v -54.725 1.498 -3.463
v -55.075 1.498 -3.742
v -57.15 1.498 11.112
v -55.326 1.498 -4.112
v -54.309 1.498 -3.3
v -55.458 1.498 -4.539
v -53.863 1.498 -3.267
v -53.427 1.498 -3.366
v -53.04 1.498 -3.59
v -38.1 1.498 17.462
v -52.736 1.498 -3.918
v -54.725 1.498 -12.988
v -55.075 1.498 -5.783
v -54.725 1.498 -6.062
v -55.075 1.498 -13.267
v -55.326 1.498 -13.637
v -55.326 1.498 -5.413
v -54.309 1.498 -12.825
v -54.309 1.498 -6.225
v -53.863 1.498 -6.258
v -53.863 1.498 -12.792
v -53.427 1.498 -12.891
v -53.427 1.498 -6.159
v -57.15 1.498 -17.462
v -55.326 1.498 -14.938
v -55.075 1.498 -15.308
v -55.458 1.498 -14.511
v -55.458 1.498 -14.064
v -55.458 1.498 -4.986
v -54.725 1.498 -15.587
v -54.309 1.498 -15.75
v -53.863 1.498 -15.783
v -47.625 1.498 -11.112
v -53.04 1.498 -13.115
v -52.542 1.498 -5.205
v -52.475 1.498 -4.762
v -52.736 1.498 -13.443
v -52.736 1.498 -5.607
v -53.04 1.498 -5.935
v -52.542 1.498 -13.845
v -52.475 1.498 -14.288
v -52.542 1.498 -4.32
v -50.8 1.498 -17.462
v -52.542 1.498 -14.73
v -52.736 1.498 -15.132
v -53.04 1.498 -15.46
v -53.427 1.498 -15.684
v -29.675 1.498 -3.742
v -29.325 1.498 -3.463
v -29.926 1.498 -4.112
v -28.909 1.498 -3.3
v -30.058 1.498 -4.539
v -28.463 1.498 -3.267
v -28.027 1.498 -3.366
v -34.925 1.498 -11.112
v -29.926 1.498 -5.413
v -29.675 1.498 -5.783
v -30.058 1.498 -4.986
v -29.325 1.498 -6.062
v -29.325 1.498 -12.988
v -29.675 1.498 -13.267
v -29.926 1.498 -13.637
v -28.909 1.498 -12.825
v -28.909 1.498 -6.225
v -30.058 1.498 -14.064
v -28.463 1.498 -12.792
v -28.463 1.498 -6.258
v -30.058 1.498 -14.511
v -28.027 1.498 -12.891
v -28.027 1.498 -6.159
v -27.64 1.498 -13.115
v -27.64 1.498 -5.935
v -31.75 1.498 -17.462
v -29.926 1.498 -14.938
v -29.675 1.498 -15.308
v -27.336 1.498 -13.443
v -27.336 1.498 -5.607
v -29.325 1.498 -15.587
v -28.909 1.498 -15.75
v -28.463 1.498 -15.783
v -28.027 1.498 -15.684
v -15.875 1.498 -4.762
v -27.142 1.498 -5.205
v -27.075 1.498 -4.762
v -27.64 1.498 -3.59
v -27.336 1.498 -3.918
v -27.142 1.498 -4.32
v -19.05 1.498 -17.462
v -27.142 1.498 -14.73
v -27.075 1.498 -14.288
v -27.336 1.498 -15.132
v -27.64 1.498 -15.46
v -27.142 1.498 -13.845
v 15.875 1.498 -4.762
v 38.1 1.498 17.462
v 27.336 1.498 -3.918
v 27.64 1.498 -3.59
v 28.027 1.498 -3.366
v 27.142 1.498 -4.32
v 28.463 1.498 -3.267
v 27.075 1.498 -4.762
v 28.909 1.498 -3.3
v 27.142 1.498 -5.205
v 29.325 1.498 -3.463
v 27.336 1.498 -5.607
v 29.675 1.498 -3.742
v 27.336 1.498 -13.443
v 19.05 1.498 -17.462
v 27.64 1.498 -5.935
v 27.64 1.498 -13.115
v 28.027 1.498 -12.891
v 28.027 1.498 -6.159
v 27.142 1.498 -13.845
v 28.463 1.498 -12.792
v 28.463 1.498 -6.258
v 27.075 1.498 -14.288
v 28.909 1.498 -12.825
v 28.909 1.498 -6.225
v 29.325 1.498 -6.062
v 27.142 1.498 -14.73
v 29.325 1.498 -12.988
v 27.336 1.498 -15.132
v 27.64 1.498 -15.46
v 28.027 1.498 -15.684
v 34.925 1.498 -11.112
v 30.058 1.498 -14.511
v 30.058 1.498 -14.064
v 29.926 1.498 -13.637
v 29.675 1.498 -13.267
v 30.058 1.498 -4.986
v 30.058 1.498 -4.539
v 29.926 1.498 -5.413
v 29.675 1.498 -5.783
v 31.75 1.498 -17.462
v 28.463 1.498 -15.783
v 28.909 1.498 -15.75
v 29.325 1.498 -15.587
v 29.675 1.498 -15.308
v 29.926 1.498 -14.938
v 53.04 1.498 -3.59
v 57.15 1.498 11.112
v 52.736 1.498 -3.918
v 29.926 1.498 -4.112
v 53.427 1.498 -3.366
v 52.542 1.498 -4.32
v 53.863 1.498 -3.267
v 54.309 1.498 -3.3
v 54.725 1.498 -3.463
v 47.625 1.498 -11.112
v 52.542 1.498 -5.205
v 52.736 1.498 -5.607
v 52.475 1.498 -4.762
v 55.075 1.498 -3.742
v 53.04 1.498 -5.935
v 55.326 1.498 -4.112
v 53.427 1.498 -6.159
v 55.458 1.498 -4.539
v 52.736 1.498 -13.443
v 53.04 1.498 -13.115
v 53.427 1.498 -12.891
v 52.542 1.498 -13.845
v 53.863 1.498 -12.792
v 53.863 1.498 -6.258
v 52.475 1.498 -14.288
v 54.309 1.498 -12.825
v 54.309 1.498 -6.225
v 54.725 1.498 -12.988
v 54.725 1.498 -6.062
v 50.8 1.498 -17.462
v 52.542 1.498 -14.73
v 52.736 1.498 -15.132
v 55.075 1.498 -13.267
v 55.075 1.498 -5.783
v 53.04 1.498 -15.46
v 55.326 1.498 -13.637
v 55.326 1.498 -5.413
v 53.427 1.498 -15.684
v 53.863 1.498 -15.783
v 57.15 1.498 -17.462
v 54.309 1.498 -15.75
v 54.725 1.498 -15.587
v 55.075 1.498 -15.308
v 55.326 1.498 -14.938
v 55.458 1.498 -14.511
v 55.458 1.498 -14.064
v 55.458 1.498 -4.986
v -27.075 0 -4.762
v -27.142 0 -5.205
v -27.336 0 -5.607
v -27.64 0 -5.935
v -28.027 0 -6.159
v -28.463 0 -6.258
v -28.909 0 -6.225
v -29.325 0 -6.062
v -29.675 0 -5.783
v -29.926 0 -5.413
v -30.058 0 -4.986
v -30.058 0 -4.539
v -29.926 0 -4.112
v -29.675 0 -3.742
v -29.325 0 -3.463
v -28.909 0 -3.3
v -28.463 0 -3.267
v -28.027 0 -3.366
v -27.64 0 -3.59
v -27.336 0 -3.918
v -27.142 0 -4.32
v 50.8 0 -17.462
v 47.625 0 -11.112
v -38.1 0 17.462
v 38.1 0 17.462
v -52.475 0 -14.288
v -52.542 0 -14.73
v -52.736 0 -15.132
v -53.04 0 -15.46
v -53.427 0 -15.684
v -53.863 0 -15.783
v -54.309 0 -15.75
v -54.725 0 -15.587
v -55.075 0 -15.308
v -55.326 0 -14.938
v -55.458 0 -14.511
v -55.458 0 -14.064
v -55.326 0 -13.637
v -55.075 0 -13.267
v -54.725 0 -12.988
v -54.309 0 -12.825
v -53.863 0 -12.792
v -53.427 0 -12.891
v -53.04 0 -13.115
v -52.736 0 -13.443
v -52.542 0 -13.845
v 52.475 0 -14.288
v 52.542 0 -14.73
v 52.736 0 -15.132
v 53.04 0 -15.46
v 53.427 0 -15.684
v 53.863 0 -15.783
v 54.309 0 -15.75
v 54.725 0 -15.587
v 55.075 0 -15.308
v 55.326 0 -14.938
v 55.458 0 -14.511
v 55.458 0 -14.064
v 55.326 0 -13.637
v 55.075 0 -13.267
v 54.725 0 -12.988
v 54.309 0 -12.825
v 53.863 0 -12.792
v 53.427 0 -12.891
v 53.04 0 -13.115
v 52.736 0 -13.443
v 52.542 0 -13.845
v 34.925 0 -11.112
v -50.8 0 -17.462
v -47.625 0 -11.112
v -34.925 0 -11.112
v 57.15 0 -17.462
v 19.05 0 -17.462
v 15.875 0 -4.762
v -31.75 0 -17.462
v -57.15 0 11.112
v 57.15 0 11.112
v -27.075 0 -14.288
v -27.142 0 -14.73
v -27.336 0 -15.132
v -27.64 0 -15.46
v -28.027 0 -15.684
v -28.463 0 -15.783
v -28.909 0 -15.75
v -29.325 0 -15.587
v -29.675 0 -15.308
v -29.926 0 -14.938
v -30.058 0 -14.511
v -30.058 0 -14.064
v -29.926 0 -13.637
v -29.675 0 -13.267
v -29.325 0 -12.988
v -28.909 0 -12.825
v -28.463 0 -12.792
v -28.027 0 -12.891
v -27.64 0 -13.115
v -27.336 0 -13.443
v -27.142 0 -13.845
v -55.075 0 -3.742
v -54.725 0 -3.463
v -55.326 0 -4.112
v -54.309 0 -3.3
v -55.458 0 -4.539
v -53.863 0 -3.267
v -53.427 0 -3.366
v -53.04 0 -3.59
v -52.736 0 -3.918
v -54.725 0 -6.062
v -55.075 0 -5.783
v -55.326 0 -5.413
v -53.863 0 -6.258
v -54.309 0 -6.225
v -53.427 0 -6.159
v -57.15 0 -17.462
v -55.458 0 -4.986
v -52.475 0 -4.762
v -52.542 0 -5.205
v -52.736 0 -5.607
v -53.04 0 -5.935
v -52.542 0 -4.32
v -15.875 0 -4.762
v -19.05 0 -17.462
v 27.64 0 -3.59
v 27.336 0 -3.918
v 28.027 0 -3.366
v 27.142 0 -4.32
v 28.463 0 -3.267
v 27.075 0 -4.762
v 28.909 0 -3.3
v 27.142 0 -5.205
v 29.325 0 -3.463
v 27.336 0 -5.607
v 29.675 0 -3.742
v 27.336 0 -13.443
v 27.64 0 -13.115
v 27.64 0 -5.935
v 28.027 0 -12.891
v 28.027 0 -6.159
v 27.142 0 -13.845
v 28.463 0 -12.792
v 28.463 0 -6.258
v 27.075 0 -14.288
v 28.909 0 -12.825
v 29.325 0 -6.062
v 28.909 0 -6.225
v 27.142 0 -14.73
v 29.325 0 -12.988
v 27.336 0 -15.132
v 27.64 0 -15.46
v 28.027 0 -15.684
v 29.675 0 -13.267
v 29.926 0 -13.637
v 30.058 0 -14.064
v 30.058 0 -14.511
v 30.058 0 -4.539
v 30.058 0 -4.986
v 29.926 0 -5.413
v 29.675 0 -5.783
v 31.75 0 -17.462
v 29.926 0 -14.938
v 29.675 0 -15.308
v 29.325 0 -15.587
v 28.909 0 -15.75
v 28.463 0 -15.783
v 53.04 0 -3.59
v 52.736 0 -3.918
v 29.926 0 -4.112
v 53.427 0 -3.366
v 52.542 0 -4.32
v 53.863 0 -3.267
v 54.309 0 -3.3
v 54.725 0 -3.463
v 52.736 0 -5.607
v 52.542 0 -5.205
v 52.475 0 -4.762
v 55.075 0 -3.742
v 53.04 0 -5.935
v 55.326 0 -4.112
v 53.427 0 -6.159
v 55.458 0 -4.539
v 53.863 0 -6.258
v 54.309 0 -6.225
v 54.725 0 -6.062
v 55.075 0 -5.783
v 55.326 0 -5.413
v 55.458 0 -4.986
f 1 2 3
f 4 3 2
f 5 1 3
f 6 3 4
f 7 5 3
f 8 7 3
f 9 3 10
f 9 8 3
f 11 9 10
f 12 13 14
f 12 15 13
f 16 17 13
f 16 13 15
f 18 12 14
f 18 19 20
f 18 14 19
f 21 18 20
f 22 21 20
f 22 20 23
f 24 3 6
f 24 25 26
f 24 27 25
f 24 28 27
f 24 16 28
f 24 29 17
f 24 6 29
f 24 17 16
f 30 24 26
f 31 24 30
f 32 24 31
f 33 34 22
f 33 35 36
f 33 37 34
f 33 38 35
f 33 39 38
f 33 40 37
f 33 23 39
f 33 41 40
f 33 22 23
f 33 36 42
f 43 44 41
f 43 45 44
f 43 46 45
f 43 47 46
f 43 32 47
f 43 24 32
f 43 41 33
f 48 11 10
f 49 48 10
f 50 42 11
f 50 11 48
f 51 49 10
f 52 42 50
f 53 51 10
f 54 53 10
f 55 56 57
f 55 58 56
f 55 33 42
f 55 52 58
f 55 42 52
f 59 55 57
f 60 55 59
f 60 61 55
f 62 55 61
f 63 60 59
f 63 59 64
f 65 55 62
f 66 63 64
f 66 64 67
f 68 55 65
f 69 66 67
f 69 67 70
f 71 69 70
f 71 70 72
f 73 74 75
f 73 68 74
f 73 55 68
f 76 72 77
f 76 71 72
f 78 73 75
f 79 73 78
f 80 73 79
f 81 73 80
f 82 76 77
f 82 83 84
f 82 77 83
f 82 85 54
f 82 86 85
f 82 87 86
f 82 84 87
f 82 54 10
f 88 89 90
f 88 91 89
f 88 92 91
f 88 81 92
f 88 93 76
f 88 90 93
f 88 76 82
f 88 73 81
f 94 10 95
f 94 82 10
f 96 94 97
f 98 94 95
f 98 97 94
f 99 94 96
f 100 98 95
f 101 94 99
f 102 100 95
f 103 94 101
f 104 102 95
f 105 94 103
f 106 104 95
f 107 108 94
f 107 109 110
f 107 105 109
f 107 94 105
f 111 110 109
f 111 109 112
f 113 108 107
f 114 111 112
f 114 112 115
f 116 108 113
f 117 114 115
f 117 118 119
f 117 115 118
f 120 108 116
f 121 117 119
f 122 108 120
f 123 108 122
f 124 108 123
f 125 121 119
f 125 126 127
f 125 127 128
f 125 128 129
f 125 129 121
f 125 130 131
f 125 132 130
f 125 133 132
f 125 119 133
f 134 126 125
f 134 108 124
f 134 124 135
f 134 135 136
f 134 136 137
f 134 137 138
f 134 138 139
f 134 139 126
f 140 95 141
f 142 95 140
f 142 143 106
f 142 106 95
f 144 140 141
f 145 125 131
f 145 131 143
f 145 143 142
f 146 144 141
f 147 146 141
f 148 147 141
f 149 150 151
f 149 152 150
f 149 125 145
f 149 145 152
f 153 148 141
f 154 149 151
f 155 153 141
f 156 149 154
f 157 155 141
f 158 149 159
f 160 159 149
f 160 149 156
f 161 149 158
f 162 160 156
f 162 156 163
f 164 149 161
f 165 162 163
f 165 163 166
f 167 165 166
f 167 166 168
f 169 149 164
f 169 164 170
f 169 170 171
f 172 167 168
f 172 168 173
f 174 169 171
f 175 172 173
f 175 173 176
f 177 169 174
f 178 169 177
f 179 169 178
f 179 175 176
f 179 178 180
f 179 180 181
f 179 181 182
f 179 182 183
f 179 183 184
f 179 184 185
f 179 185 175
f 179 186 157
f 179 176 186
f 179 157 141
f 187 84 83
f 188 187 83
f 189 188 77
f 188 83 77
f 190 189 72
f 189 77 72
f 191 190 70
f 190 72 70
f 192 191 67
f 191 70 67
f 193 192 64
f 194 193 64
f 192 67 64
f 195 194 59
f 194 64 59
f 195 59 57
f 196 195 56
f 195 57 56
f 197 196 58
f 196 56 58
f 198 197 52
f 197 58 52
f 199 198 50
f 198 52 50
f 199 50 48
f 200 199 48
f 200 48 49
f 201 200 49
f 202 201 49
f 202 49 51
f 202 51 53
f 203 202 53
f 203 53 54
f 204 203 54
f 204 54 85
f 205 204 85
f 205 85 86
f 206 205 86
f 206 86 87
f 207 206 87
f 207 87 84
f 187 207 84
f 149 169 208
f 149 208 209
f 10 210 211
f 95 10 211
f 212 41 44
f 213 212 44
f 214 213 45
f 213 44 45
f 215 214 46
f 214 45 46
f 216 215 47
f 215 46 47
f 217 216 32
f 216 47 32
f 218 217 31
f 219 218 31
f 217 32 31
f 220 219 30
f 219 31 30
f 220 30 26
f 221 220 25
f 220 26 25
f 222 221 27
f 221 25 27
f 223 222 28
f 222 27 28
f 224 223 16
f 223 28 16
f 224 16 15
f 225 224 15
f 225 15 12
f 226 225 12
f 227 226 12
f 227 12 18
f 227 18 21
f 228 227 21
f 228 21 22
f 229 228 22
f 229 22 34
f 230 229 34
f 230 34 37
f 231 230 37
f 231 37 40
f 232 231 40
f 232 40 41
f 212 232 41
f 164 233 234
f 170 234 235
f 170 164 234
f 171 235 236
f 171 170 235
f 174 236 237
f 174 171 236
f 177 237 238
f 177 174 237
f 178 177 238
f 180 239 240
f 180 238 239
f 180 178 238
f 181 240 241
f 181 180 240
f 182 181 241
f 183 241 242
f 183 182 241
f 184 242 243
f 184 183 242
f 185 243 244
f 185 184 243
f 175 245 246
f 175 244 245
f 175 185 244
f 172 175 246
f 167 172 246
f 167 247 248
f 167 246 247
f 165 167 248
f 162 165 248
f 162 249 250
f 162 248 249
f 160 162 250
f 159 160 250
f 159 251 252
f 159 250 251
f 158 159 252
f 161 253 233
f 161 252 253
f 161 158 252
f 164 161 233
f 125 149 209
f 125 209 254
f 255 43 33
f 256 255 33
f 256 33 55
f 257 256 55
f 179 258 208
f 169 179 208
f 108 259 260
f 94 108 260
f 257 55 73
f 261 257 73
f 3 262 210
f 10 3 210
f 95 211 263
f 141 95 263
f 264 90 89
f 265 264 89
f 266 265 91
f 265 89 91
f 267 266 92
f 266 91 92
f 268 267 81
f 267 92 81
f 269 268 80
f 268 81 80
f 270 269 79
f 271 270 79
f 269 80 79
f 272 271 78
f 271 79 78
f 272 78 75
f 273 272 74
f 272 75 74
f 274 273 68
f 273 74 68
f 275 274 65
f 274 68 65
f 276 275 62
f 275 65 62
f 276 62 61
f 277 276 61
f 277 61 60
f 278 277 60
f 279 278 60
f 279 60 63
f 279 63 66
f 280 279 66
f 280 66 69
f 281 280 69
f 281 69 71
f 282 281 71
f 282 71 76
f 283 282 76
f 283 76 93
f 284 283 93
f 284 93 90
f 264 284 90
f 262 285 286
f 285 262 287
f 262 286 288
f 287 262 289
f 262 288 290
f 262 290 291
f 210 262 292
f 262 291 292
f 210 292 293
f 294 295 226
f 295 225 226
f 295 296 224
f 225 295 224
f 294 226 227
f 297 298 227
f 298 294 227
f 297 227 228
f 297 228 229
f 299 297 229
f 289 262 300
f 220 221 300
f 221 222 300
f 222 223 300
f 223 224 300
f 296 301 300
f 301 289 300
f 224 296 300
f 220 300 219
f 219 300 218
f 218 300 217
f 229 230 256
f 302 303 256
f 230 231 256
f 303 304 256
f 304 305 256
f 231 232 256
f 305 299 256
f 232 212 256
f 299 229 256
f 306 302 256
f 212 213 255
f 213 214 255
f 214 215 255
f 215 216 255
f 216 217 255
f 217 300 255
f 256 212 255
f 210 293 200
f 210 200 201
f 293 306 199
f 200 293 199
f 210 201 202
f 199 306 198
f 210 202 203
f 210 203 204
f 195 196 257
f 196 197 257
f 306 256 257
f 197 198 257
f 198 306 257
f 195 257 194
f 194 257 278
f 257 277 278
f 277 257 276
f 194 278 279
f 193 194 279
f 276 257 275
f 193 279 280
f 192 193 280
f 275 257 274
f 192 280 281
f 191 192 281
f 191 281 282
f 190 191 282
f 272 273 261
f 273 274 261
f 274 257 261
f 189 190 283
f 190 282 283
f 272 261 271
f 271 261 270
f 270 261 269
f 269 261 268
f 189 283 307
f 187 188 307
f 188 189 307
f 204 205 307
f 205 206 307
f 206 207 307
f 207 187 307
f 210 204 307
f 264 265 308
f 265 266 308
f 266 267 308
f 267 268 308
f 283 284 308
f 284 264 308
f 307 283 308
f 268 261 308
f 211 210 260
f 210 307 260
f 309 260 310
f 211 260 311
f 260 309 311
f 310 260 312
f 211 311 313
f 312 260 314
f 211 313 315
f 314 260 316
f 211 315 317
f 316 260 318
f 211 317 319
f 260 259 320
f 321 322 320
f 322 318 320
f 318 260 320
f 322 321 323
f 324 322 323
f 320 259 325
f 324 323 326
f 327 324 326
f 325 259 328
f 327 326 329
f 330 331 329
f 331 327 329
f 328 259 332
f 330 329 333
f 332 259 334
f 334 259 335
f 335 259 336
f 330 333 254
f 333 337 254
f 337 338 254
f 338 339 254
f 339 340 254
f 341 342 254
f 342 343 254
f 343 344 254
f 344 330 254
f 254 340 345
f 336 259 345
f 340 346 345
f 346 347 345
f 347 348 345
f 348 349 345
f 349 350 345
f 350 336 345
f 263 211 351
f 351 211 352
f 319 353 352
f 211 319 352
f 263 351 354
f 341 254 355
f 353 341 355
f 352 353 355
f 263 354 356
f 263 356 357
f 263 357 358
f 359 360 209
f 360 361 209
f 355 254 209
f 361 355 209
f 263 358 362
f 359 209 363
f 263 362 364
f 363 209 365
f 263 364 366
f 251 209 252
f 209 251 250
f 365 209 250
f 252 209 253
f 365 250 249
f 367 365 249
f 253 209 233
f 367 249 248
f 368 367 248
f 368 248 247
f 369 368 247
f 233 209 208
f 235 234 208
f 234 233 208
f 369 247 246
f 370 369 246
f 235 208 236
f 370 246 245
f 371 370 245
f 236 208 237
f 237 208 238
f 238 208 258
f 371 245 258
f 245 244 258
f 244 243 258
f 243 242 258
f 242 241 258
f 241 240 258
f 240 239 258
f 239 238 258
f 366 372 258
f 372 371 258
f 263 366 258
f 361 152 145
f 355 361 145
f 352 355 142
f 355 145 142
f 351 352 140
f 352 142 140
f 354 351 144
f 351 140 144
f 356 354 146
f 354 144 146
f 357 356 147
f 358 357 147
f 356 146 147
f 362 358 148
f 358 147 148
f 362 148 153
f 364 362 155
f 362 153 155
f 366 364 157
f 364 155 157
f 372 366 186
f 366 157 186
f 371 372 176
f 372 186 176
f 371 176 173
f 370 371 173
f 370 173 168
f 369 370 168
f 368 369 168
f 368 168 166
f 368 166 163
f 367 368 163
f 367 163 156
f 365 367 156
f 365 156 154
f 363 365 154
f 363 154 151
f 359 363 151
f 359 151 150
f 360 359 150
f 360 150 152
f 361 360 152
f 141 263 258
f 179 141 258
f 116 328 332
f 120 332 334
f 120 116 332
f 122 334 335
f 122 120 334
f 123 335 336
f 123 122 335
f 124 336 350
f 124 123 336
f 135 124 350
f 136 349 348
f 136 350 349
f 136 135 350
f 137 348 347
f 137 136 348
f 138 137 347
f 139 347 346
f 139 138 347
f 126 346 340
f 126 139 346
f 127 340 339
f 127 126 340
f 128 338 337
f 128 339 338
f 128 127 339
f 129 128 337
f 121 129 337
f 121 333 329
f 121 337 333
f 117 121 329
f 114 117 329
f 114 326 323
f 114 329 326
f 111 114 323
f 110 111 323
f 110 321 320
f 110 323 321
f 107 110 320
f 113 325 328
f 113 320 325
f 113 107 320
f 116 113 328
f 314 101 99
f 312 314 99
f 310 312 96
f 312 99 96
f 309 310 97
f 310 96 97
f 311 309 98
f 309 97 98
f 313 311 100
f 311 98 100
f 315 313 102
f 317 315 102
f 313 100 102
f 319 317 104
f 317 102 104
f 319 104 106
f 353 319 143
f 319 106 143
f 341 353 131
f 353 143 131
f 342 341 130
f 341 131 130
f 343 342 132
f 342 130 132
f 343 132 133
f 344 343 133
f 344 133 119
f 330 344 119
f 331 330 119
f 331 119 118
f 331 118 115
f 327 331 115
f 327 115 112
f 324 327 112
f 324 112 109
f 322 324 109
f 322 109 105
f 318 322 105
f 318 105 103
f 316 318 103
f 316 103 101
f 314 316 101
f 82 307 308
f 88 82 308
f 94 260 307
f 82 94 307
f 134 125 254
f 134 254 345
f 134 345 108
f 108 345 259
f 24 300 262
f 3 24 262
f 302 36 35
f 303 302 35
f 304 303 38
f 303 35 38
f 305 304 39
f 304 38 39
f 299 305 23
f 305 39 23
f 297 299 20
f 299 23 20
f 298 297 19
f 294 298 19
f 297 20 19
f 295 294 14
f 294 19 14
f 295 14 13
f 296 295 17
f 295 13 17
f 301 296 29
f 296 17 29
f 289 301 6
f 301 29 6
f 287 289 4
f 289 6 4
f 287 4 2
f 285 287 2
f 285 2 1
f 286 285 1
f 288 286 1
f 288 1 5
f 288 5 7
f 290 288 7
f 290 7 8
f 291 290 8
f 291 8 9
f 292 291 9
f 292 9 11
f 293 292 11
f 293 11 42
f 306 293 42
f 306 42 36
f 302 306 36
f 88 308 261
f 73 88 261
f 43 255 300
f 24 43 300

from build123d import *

# Parameters (mm, degrees)
BOSS_EXTRUDE1_DEPTH     = 1.498487888
SKETCH2_R               = 1.5
CUT_EXTRUDE1_DEPTH      = 2.498487888
CUT_EXTRUDE2_DEPTH      = 2.498487888
LPATTERN1_COUNT         = 2
LPATTERN1_PITCH         = 9.525
MIRROR1_COPY_1_SKETCH_R = 1.5
MIRROR1_COPY_1_DEPTH    = 2.498487888


with BuildPart() as part:
    # Sketch1 → Boss-Extrude1 (new body)
    with BuildSketch(Plane(origin=(0, 0, 0), x_dir=(1, 0, 0), z_dir=(0, 1, 0))):
        Polygon((-57.15, -11.1125), (-38.1, -17.4625), (38.1, -17.4625), (57.15, -11.1125), (57.15, 17.4625), (19.05, 17.4625), (15.875, 4.7625), (-15.875, 4.7625), (-19.05, 17.4625), (-57.15, 17.4625), align=None)
    extrude(amount=BOSS_EXTRUDE1_DEPTH)

    # Sketch2 → Cut-Extrude1 (cut, through all)
    with BuildSketch(Plane(origin=(0, 1.498487888, 0), x_dir=(1, 0, 0), z_dir=(0, 1, 0))):
        with Locations((-53.975, 14.2875)):
            Circle(SKETCH2_R)
        with Locations((-28.575, 14.2875)):
            Circle(SKETCH2_R)
    cut_extrude1 = extrude(amount=-CUT_EXTRUDE1_DEPTH, mode=Mode.SUBTRACT)

    # Sketch5 → Cut-Extrude2 (cut, through all)
    with BuildSketch(Plane(origin=(0, 1.498487888, 0), x_dir=(1, 0, 0), z_dir=(0, 1, 0))):
        Polygon((-50.8, 17.4625), (-47.625, 11.1125), (-34.925, 11.1125), (-31.75, 17.4625), align=None)
    cut_extrude2 = extrude(amount=-CUT_EXTRUDE2_DEPTH, mode=Mode.SUBTRACT)

    # LPattern1: Cut-Extrude1 ×2
    with Locations(*[(0, 0, i * LPATTERN1_PITCH) for i in range(1, LPATTERN1_COUNT)]):
        add(cut_extrude1, mode=Mode.SUBTRACT)

    # Mirror1: Cut-Extrude2, Cut-Extrude1 across plane
    add(cut_extrude2.mirror(Plane(origin=(0, 0, 0), x_dir=(0, 0, 1), z_dir=(1, 0, 0))), mode=Mode.SUBTRACT)
    add(cut_extrude1.mirror(Plane(origin=(0, 0, 0), x_dir=(0, 0, 1), z_dir=(1, 0, 0))), mode=Mode.SUBTRACT)

    # Mirror1 copy 1 sketch → Mirror1 copy 1 (cut, through all)
    with BuildSketch(Plane(origin=(0, 1.498487888, 9.525), x_dir=(-1, 0, 0), z_dir=(0, 1, 0))):
        with Locations((-53.975, -14.2875)):
            Circle(MIRROR1_COPY_1_SKETCH_R)
        with Locations((-28.575, -14.2875)):
            Circle(MIRROR1_COPY_1_SKETCH_R)
    extrude(amount=-MIRROR1_COPY_1_DEPTH, mode=Mode.SUBTRACT)


solid = part.part
